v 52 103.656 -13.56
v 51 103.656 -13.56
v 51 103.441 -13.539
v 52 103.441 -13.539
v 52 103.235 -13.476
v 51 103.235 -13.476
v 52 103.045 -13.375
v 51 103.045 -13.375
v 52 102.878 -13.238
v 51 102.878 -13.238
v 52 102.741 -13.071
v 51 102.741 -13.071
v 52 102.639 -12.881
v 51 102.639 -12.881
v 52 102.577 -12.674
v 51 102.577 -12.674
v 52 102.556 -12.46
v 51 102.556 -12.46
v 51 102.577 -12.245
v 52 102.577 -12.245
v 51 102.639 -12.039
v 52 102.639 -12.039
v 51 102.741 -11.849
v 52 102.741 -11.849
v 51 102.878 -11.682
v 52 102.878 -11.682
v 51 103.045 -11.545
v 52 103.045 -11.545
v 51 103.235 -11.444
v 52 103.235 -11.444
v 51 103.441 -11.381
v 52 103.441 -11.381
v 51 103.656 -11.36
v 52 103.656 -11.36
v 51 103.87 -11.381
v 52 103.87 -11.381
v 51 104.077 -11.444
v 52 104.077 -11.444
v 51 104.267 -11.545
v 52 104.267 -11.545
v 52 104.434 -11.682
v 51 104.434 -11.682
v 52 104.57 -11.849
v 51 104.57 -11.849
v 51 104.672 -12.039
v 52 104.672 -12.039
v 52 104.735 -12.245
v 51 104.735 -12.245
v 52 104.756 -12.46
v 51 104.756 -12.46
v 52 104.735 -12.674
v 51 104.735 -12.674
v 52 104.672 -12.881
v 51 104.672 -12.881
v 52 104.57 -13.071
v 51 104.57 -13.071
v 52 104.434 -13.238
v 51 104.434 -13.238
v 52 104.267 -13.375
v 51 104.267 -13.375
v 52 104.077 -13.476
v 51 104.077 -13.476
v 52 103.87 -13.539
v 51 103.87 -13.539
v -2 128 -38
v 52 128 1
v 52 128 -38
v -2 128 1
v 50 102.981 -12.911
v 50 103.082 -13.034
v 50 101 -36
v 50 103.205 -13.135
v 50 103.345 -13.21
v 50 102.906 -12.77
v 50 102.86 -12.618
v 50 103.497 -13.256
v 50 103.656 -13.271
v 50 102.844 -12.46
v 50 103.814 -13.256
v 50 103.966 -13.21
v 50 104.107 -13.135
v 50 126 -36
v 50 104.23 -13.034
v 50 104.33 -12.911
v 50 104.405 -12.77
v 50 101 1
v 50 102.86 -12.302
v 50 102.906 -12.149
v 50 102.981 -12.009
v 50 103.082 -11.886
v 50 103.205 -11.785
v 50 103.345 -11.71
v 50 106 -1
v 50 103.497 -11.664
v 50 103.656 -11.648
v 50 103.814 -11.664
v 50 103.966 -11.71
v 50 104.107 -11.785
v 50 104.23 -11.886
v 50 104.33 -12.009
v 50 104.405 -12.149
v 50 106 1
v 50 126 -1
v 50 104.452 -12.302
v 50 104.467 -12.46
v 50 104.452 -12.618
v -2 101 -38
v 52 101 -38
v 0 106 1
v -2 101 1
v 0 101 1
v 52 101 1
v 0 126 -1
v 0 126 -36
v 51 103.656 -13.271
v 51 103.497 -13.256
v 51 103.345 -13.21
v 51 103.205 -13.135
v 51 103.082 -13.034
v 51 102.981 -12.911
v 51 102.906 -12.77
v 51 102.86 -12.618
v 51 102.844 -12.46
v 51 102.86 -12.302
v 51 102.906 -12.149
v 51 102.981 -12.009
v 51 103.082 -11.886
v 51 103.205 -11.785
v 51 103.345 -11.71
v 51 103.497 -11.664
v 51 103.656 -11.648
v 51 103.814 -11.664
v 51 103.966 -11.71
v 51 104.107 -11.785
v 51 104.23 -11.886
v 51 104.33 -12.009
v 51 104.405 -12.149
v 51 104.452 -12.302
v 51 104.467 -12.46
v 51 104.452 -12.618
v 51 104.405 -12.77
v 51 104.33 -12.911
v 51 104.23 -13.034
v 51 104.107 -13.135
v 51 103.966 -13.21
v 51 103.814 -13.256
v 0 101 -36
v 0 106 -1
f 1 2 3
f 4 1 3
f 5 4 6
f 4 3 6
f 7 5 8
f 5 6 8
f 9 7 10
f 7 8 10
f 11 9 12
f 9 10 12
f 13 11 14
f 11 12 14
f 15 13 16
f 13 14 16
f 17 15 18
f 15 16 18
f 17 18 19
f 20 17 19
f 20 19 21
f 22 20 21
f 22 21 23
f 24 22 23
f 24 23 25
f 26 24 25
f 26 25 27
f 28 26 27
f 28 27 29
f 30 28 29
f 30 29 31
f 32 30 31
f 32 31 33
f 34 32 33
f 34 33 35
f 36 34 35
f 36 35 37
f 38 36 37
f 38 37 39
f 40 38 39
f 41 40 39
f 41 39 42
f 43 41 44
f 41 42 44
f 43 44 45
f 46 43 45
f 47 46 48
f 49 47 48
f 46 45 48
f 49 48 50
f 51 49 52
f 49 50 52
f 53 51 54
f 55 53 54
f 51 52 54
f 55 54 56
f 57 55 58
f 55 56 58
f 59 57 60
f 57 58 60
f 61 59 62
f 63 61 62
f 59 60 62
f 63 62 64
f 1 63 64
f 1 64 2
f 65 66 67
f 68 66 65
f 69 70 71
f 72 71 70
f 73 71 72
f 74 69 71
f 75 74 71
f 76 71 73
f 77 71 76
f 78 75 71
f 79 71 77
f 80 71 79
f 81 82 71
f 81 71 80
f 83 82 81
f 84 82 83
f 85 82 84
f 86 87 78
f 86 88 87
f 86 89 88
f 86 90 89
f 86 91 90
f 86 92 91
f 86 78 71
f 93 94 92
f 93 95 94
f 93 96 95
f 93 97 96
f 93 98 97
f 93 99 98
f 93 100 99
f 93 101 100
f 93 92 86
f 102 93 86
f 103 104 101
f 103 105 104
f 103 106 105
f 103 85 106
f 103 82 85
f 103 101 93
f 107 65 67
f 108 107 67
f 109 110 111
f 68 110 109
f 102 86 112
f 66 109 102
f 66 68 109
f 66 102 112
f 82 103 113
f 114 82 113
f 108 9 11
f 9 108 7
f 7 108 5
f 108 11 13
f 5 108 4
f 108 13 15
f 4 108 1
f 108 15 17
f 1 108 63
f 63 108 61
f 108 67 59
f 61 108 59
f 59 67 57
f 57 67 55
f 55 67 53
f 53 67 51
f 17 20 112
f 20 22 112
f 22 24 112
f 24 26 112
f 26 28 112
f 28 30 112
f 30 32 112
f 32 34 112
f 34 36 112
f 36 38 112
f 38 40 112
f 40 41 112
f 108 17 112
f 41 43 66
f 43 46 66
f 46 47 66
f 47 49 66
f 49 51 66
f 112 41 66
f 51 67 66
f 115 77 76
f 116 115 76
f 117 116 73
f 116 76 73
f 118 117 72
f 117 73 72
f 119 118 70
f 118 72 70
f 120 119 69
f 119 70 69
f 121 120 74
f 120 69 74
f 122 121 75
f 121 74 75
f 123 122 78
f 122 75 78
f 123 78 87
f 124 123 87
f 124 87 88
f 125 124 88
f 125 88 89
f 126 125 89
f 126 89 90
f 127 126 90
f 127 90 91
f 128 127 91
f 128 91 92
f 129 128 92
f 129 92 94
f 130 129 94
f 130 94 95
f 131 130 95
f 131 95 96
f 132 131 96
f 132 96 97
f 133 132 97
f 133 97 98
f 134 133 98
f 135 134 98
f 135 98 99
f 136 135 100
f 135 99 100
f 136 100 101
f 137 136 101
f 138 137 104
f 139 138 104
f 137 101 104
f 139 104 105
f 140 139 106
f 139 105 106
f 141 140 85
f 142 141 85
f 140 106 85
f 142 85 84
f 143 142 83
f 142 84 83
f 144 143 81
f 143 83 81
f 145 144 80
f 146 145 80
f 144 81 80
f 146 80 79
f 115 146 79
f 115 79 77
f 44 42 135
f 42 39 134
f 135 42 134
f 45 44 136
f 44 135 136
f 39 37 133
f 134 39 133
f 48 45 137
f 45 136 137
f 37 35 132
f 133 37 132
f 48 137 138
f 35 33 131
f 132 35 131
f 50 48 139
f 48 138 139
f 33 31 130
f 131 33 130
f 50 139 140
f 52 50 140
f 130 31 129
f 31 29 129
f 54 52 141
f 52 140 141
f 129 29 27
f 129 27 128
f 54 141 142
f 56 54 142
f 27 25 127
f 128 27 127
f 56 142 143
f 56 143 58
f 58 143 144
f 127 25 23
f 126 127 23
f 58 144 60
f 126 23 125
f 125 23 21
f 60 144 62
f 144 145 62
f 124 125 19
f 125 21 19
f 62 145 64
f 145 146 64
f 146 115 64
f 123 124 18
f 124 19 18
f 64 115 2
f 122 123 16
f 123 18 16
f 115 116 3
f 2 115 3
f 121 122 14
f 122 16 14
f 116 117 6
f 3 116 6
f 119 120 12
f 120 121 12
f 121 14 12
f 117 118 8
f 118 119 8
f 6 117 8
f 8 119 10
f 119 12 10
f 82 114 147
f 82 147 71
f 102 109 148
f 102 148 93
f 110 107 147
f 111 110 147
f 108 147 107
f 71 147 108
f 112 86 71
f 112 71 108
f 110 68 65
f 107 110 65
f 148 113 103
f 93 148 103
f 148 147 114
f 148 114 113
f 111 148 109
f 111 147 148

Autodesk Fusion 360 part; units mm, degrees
sketch "Sketch3" plane through (0, 106, 0) normal (0, 1, 0) x (-1, 0, 0)
  line L0 (0, -36) -> (0, 15)
  line L1 (0, 15) -> (-50, 15)
  line L2 (-50, 15) -> (-50, -36)
  line L3 (-50, -36) -> (0, -36)
  line L4 (0, -36) -> (-50, -36)
  line L5 (-50, -36) -> (-50, 0)
  line L6 (-50, 0) -> (0, 0)
  line L7 (0, 0) -> (0, -36)
  dimension "d1" = 36
sketch "Sketch1" plane through (0, 106, 0) normal (0, 1, 0) x (-1, 0, 0)
  line L0 (-50, 1) -> (0, 1)
  line L1 (0, 1) -> (0, -36)
  line L2 (0, -36) -> (-50, -36)
  line L3 (-50, -36) -> (-50, 1)
extrude "Extrude1" add sketch "Sketch1" along normal blind 22
extrude "Extrude2" add 1 faces at (50, 113.3333, -23.6667) along direction (1, 0, 0) blind 2
extrude "Extrude3" add 1 faces at (0, 113.3333, -11.3333) along direction (-1, 0, 0) blind 2
extrude "Extrude4" add 1 faces at (16, 113.3333, -36) along direction (0, 0, -1) blind 2
extrude "Extrude5" add 1 faces at (34, 106, -25) along direction (0, -1, 0) blind 5
shell "Shell1" thickness 2 removed faces 1 at (34, 101, -25)
sketch "Sketch2" plane through (0, 101, 0) normal (0, -1, 0) x (1, 0, 0)
  line L0 (50, -36) -> (0, -36)
  line L1 (0, -36) -> (0, -1)
  line L2 (0, -1) -> (50, -1)
  line L3 (50, -1) -> (50, -36)
  line L4 (52, -38) -> (52, 1)
  line L5 (52, 1) -> (-2, 1)
  line L6 (-2, 1) -> (-2, -38)
  line L7 (-2, -38) -> (52, -38)
  line L8 (0, 1) -> (50, 1)
  line L9 (50, 1) -> (50, -1)
  line L10 (50, -1) -> (0, -1)
  line L11 (0, -1) -> (0, 1)
extrude "Extrude6" cut sketch "Sketch2" against normal blind 5 contours L2 L5 L8 L9 L10 L11
hole "Hole1" at (52, 103.6557, -12.4599) direction (-1, 0, 0) diameter 1.623 depth 26 tip angle 118 counterbore diameter 2.2 counterbore depth 1
ref_plane "WorkPlane1" through (25, 114.5, -18.5) normal (1, 0, 0) x (0, 0, -1)
hole "Hole2" [suppressed]
hole "Hole3" [suppressed]
